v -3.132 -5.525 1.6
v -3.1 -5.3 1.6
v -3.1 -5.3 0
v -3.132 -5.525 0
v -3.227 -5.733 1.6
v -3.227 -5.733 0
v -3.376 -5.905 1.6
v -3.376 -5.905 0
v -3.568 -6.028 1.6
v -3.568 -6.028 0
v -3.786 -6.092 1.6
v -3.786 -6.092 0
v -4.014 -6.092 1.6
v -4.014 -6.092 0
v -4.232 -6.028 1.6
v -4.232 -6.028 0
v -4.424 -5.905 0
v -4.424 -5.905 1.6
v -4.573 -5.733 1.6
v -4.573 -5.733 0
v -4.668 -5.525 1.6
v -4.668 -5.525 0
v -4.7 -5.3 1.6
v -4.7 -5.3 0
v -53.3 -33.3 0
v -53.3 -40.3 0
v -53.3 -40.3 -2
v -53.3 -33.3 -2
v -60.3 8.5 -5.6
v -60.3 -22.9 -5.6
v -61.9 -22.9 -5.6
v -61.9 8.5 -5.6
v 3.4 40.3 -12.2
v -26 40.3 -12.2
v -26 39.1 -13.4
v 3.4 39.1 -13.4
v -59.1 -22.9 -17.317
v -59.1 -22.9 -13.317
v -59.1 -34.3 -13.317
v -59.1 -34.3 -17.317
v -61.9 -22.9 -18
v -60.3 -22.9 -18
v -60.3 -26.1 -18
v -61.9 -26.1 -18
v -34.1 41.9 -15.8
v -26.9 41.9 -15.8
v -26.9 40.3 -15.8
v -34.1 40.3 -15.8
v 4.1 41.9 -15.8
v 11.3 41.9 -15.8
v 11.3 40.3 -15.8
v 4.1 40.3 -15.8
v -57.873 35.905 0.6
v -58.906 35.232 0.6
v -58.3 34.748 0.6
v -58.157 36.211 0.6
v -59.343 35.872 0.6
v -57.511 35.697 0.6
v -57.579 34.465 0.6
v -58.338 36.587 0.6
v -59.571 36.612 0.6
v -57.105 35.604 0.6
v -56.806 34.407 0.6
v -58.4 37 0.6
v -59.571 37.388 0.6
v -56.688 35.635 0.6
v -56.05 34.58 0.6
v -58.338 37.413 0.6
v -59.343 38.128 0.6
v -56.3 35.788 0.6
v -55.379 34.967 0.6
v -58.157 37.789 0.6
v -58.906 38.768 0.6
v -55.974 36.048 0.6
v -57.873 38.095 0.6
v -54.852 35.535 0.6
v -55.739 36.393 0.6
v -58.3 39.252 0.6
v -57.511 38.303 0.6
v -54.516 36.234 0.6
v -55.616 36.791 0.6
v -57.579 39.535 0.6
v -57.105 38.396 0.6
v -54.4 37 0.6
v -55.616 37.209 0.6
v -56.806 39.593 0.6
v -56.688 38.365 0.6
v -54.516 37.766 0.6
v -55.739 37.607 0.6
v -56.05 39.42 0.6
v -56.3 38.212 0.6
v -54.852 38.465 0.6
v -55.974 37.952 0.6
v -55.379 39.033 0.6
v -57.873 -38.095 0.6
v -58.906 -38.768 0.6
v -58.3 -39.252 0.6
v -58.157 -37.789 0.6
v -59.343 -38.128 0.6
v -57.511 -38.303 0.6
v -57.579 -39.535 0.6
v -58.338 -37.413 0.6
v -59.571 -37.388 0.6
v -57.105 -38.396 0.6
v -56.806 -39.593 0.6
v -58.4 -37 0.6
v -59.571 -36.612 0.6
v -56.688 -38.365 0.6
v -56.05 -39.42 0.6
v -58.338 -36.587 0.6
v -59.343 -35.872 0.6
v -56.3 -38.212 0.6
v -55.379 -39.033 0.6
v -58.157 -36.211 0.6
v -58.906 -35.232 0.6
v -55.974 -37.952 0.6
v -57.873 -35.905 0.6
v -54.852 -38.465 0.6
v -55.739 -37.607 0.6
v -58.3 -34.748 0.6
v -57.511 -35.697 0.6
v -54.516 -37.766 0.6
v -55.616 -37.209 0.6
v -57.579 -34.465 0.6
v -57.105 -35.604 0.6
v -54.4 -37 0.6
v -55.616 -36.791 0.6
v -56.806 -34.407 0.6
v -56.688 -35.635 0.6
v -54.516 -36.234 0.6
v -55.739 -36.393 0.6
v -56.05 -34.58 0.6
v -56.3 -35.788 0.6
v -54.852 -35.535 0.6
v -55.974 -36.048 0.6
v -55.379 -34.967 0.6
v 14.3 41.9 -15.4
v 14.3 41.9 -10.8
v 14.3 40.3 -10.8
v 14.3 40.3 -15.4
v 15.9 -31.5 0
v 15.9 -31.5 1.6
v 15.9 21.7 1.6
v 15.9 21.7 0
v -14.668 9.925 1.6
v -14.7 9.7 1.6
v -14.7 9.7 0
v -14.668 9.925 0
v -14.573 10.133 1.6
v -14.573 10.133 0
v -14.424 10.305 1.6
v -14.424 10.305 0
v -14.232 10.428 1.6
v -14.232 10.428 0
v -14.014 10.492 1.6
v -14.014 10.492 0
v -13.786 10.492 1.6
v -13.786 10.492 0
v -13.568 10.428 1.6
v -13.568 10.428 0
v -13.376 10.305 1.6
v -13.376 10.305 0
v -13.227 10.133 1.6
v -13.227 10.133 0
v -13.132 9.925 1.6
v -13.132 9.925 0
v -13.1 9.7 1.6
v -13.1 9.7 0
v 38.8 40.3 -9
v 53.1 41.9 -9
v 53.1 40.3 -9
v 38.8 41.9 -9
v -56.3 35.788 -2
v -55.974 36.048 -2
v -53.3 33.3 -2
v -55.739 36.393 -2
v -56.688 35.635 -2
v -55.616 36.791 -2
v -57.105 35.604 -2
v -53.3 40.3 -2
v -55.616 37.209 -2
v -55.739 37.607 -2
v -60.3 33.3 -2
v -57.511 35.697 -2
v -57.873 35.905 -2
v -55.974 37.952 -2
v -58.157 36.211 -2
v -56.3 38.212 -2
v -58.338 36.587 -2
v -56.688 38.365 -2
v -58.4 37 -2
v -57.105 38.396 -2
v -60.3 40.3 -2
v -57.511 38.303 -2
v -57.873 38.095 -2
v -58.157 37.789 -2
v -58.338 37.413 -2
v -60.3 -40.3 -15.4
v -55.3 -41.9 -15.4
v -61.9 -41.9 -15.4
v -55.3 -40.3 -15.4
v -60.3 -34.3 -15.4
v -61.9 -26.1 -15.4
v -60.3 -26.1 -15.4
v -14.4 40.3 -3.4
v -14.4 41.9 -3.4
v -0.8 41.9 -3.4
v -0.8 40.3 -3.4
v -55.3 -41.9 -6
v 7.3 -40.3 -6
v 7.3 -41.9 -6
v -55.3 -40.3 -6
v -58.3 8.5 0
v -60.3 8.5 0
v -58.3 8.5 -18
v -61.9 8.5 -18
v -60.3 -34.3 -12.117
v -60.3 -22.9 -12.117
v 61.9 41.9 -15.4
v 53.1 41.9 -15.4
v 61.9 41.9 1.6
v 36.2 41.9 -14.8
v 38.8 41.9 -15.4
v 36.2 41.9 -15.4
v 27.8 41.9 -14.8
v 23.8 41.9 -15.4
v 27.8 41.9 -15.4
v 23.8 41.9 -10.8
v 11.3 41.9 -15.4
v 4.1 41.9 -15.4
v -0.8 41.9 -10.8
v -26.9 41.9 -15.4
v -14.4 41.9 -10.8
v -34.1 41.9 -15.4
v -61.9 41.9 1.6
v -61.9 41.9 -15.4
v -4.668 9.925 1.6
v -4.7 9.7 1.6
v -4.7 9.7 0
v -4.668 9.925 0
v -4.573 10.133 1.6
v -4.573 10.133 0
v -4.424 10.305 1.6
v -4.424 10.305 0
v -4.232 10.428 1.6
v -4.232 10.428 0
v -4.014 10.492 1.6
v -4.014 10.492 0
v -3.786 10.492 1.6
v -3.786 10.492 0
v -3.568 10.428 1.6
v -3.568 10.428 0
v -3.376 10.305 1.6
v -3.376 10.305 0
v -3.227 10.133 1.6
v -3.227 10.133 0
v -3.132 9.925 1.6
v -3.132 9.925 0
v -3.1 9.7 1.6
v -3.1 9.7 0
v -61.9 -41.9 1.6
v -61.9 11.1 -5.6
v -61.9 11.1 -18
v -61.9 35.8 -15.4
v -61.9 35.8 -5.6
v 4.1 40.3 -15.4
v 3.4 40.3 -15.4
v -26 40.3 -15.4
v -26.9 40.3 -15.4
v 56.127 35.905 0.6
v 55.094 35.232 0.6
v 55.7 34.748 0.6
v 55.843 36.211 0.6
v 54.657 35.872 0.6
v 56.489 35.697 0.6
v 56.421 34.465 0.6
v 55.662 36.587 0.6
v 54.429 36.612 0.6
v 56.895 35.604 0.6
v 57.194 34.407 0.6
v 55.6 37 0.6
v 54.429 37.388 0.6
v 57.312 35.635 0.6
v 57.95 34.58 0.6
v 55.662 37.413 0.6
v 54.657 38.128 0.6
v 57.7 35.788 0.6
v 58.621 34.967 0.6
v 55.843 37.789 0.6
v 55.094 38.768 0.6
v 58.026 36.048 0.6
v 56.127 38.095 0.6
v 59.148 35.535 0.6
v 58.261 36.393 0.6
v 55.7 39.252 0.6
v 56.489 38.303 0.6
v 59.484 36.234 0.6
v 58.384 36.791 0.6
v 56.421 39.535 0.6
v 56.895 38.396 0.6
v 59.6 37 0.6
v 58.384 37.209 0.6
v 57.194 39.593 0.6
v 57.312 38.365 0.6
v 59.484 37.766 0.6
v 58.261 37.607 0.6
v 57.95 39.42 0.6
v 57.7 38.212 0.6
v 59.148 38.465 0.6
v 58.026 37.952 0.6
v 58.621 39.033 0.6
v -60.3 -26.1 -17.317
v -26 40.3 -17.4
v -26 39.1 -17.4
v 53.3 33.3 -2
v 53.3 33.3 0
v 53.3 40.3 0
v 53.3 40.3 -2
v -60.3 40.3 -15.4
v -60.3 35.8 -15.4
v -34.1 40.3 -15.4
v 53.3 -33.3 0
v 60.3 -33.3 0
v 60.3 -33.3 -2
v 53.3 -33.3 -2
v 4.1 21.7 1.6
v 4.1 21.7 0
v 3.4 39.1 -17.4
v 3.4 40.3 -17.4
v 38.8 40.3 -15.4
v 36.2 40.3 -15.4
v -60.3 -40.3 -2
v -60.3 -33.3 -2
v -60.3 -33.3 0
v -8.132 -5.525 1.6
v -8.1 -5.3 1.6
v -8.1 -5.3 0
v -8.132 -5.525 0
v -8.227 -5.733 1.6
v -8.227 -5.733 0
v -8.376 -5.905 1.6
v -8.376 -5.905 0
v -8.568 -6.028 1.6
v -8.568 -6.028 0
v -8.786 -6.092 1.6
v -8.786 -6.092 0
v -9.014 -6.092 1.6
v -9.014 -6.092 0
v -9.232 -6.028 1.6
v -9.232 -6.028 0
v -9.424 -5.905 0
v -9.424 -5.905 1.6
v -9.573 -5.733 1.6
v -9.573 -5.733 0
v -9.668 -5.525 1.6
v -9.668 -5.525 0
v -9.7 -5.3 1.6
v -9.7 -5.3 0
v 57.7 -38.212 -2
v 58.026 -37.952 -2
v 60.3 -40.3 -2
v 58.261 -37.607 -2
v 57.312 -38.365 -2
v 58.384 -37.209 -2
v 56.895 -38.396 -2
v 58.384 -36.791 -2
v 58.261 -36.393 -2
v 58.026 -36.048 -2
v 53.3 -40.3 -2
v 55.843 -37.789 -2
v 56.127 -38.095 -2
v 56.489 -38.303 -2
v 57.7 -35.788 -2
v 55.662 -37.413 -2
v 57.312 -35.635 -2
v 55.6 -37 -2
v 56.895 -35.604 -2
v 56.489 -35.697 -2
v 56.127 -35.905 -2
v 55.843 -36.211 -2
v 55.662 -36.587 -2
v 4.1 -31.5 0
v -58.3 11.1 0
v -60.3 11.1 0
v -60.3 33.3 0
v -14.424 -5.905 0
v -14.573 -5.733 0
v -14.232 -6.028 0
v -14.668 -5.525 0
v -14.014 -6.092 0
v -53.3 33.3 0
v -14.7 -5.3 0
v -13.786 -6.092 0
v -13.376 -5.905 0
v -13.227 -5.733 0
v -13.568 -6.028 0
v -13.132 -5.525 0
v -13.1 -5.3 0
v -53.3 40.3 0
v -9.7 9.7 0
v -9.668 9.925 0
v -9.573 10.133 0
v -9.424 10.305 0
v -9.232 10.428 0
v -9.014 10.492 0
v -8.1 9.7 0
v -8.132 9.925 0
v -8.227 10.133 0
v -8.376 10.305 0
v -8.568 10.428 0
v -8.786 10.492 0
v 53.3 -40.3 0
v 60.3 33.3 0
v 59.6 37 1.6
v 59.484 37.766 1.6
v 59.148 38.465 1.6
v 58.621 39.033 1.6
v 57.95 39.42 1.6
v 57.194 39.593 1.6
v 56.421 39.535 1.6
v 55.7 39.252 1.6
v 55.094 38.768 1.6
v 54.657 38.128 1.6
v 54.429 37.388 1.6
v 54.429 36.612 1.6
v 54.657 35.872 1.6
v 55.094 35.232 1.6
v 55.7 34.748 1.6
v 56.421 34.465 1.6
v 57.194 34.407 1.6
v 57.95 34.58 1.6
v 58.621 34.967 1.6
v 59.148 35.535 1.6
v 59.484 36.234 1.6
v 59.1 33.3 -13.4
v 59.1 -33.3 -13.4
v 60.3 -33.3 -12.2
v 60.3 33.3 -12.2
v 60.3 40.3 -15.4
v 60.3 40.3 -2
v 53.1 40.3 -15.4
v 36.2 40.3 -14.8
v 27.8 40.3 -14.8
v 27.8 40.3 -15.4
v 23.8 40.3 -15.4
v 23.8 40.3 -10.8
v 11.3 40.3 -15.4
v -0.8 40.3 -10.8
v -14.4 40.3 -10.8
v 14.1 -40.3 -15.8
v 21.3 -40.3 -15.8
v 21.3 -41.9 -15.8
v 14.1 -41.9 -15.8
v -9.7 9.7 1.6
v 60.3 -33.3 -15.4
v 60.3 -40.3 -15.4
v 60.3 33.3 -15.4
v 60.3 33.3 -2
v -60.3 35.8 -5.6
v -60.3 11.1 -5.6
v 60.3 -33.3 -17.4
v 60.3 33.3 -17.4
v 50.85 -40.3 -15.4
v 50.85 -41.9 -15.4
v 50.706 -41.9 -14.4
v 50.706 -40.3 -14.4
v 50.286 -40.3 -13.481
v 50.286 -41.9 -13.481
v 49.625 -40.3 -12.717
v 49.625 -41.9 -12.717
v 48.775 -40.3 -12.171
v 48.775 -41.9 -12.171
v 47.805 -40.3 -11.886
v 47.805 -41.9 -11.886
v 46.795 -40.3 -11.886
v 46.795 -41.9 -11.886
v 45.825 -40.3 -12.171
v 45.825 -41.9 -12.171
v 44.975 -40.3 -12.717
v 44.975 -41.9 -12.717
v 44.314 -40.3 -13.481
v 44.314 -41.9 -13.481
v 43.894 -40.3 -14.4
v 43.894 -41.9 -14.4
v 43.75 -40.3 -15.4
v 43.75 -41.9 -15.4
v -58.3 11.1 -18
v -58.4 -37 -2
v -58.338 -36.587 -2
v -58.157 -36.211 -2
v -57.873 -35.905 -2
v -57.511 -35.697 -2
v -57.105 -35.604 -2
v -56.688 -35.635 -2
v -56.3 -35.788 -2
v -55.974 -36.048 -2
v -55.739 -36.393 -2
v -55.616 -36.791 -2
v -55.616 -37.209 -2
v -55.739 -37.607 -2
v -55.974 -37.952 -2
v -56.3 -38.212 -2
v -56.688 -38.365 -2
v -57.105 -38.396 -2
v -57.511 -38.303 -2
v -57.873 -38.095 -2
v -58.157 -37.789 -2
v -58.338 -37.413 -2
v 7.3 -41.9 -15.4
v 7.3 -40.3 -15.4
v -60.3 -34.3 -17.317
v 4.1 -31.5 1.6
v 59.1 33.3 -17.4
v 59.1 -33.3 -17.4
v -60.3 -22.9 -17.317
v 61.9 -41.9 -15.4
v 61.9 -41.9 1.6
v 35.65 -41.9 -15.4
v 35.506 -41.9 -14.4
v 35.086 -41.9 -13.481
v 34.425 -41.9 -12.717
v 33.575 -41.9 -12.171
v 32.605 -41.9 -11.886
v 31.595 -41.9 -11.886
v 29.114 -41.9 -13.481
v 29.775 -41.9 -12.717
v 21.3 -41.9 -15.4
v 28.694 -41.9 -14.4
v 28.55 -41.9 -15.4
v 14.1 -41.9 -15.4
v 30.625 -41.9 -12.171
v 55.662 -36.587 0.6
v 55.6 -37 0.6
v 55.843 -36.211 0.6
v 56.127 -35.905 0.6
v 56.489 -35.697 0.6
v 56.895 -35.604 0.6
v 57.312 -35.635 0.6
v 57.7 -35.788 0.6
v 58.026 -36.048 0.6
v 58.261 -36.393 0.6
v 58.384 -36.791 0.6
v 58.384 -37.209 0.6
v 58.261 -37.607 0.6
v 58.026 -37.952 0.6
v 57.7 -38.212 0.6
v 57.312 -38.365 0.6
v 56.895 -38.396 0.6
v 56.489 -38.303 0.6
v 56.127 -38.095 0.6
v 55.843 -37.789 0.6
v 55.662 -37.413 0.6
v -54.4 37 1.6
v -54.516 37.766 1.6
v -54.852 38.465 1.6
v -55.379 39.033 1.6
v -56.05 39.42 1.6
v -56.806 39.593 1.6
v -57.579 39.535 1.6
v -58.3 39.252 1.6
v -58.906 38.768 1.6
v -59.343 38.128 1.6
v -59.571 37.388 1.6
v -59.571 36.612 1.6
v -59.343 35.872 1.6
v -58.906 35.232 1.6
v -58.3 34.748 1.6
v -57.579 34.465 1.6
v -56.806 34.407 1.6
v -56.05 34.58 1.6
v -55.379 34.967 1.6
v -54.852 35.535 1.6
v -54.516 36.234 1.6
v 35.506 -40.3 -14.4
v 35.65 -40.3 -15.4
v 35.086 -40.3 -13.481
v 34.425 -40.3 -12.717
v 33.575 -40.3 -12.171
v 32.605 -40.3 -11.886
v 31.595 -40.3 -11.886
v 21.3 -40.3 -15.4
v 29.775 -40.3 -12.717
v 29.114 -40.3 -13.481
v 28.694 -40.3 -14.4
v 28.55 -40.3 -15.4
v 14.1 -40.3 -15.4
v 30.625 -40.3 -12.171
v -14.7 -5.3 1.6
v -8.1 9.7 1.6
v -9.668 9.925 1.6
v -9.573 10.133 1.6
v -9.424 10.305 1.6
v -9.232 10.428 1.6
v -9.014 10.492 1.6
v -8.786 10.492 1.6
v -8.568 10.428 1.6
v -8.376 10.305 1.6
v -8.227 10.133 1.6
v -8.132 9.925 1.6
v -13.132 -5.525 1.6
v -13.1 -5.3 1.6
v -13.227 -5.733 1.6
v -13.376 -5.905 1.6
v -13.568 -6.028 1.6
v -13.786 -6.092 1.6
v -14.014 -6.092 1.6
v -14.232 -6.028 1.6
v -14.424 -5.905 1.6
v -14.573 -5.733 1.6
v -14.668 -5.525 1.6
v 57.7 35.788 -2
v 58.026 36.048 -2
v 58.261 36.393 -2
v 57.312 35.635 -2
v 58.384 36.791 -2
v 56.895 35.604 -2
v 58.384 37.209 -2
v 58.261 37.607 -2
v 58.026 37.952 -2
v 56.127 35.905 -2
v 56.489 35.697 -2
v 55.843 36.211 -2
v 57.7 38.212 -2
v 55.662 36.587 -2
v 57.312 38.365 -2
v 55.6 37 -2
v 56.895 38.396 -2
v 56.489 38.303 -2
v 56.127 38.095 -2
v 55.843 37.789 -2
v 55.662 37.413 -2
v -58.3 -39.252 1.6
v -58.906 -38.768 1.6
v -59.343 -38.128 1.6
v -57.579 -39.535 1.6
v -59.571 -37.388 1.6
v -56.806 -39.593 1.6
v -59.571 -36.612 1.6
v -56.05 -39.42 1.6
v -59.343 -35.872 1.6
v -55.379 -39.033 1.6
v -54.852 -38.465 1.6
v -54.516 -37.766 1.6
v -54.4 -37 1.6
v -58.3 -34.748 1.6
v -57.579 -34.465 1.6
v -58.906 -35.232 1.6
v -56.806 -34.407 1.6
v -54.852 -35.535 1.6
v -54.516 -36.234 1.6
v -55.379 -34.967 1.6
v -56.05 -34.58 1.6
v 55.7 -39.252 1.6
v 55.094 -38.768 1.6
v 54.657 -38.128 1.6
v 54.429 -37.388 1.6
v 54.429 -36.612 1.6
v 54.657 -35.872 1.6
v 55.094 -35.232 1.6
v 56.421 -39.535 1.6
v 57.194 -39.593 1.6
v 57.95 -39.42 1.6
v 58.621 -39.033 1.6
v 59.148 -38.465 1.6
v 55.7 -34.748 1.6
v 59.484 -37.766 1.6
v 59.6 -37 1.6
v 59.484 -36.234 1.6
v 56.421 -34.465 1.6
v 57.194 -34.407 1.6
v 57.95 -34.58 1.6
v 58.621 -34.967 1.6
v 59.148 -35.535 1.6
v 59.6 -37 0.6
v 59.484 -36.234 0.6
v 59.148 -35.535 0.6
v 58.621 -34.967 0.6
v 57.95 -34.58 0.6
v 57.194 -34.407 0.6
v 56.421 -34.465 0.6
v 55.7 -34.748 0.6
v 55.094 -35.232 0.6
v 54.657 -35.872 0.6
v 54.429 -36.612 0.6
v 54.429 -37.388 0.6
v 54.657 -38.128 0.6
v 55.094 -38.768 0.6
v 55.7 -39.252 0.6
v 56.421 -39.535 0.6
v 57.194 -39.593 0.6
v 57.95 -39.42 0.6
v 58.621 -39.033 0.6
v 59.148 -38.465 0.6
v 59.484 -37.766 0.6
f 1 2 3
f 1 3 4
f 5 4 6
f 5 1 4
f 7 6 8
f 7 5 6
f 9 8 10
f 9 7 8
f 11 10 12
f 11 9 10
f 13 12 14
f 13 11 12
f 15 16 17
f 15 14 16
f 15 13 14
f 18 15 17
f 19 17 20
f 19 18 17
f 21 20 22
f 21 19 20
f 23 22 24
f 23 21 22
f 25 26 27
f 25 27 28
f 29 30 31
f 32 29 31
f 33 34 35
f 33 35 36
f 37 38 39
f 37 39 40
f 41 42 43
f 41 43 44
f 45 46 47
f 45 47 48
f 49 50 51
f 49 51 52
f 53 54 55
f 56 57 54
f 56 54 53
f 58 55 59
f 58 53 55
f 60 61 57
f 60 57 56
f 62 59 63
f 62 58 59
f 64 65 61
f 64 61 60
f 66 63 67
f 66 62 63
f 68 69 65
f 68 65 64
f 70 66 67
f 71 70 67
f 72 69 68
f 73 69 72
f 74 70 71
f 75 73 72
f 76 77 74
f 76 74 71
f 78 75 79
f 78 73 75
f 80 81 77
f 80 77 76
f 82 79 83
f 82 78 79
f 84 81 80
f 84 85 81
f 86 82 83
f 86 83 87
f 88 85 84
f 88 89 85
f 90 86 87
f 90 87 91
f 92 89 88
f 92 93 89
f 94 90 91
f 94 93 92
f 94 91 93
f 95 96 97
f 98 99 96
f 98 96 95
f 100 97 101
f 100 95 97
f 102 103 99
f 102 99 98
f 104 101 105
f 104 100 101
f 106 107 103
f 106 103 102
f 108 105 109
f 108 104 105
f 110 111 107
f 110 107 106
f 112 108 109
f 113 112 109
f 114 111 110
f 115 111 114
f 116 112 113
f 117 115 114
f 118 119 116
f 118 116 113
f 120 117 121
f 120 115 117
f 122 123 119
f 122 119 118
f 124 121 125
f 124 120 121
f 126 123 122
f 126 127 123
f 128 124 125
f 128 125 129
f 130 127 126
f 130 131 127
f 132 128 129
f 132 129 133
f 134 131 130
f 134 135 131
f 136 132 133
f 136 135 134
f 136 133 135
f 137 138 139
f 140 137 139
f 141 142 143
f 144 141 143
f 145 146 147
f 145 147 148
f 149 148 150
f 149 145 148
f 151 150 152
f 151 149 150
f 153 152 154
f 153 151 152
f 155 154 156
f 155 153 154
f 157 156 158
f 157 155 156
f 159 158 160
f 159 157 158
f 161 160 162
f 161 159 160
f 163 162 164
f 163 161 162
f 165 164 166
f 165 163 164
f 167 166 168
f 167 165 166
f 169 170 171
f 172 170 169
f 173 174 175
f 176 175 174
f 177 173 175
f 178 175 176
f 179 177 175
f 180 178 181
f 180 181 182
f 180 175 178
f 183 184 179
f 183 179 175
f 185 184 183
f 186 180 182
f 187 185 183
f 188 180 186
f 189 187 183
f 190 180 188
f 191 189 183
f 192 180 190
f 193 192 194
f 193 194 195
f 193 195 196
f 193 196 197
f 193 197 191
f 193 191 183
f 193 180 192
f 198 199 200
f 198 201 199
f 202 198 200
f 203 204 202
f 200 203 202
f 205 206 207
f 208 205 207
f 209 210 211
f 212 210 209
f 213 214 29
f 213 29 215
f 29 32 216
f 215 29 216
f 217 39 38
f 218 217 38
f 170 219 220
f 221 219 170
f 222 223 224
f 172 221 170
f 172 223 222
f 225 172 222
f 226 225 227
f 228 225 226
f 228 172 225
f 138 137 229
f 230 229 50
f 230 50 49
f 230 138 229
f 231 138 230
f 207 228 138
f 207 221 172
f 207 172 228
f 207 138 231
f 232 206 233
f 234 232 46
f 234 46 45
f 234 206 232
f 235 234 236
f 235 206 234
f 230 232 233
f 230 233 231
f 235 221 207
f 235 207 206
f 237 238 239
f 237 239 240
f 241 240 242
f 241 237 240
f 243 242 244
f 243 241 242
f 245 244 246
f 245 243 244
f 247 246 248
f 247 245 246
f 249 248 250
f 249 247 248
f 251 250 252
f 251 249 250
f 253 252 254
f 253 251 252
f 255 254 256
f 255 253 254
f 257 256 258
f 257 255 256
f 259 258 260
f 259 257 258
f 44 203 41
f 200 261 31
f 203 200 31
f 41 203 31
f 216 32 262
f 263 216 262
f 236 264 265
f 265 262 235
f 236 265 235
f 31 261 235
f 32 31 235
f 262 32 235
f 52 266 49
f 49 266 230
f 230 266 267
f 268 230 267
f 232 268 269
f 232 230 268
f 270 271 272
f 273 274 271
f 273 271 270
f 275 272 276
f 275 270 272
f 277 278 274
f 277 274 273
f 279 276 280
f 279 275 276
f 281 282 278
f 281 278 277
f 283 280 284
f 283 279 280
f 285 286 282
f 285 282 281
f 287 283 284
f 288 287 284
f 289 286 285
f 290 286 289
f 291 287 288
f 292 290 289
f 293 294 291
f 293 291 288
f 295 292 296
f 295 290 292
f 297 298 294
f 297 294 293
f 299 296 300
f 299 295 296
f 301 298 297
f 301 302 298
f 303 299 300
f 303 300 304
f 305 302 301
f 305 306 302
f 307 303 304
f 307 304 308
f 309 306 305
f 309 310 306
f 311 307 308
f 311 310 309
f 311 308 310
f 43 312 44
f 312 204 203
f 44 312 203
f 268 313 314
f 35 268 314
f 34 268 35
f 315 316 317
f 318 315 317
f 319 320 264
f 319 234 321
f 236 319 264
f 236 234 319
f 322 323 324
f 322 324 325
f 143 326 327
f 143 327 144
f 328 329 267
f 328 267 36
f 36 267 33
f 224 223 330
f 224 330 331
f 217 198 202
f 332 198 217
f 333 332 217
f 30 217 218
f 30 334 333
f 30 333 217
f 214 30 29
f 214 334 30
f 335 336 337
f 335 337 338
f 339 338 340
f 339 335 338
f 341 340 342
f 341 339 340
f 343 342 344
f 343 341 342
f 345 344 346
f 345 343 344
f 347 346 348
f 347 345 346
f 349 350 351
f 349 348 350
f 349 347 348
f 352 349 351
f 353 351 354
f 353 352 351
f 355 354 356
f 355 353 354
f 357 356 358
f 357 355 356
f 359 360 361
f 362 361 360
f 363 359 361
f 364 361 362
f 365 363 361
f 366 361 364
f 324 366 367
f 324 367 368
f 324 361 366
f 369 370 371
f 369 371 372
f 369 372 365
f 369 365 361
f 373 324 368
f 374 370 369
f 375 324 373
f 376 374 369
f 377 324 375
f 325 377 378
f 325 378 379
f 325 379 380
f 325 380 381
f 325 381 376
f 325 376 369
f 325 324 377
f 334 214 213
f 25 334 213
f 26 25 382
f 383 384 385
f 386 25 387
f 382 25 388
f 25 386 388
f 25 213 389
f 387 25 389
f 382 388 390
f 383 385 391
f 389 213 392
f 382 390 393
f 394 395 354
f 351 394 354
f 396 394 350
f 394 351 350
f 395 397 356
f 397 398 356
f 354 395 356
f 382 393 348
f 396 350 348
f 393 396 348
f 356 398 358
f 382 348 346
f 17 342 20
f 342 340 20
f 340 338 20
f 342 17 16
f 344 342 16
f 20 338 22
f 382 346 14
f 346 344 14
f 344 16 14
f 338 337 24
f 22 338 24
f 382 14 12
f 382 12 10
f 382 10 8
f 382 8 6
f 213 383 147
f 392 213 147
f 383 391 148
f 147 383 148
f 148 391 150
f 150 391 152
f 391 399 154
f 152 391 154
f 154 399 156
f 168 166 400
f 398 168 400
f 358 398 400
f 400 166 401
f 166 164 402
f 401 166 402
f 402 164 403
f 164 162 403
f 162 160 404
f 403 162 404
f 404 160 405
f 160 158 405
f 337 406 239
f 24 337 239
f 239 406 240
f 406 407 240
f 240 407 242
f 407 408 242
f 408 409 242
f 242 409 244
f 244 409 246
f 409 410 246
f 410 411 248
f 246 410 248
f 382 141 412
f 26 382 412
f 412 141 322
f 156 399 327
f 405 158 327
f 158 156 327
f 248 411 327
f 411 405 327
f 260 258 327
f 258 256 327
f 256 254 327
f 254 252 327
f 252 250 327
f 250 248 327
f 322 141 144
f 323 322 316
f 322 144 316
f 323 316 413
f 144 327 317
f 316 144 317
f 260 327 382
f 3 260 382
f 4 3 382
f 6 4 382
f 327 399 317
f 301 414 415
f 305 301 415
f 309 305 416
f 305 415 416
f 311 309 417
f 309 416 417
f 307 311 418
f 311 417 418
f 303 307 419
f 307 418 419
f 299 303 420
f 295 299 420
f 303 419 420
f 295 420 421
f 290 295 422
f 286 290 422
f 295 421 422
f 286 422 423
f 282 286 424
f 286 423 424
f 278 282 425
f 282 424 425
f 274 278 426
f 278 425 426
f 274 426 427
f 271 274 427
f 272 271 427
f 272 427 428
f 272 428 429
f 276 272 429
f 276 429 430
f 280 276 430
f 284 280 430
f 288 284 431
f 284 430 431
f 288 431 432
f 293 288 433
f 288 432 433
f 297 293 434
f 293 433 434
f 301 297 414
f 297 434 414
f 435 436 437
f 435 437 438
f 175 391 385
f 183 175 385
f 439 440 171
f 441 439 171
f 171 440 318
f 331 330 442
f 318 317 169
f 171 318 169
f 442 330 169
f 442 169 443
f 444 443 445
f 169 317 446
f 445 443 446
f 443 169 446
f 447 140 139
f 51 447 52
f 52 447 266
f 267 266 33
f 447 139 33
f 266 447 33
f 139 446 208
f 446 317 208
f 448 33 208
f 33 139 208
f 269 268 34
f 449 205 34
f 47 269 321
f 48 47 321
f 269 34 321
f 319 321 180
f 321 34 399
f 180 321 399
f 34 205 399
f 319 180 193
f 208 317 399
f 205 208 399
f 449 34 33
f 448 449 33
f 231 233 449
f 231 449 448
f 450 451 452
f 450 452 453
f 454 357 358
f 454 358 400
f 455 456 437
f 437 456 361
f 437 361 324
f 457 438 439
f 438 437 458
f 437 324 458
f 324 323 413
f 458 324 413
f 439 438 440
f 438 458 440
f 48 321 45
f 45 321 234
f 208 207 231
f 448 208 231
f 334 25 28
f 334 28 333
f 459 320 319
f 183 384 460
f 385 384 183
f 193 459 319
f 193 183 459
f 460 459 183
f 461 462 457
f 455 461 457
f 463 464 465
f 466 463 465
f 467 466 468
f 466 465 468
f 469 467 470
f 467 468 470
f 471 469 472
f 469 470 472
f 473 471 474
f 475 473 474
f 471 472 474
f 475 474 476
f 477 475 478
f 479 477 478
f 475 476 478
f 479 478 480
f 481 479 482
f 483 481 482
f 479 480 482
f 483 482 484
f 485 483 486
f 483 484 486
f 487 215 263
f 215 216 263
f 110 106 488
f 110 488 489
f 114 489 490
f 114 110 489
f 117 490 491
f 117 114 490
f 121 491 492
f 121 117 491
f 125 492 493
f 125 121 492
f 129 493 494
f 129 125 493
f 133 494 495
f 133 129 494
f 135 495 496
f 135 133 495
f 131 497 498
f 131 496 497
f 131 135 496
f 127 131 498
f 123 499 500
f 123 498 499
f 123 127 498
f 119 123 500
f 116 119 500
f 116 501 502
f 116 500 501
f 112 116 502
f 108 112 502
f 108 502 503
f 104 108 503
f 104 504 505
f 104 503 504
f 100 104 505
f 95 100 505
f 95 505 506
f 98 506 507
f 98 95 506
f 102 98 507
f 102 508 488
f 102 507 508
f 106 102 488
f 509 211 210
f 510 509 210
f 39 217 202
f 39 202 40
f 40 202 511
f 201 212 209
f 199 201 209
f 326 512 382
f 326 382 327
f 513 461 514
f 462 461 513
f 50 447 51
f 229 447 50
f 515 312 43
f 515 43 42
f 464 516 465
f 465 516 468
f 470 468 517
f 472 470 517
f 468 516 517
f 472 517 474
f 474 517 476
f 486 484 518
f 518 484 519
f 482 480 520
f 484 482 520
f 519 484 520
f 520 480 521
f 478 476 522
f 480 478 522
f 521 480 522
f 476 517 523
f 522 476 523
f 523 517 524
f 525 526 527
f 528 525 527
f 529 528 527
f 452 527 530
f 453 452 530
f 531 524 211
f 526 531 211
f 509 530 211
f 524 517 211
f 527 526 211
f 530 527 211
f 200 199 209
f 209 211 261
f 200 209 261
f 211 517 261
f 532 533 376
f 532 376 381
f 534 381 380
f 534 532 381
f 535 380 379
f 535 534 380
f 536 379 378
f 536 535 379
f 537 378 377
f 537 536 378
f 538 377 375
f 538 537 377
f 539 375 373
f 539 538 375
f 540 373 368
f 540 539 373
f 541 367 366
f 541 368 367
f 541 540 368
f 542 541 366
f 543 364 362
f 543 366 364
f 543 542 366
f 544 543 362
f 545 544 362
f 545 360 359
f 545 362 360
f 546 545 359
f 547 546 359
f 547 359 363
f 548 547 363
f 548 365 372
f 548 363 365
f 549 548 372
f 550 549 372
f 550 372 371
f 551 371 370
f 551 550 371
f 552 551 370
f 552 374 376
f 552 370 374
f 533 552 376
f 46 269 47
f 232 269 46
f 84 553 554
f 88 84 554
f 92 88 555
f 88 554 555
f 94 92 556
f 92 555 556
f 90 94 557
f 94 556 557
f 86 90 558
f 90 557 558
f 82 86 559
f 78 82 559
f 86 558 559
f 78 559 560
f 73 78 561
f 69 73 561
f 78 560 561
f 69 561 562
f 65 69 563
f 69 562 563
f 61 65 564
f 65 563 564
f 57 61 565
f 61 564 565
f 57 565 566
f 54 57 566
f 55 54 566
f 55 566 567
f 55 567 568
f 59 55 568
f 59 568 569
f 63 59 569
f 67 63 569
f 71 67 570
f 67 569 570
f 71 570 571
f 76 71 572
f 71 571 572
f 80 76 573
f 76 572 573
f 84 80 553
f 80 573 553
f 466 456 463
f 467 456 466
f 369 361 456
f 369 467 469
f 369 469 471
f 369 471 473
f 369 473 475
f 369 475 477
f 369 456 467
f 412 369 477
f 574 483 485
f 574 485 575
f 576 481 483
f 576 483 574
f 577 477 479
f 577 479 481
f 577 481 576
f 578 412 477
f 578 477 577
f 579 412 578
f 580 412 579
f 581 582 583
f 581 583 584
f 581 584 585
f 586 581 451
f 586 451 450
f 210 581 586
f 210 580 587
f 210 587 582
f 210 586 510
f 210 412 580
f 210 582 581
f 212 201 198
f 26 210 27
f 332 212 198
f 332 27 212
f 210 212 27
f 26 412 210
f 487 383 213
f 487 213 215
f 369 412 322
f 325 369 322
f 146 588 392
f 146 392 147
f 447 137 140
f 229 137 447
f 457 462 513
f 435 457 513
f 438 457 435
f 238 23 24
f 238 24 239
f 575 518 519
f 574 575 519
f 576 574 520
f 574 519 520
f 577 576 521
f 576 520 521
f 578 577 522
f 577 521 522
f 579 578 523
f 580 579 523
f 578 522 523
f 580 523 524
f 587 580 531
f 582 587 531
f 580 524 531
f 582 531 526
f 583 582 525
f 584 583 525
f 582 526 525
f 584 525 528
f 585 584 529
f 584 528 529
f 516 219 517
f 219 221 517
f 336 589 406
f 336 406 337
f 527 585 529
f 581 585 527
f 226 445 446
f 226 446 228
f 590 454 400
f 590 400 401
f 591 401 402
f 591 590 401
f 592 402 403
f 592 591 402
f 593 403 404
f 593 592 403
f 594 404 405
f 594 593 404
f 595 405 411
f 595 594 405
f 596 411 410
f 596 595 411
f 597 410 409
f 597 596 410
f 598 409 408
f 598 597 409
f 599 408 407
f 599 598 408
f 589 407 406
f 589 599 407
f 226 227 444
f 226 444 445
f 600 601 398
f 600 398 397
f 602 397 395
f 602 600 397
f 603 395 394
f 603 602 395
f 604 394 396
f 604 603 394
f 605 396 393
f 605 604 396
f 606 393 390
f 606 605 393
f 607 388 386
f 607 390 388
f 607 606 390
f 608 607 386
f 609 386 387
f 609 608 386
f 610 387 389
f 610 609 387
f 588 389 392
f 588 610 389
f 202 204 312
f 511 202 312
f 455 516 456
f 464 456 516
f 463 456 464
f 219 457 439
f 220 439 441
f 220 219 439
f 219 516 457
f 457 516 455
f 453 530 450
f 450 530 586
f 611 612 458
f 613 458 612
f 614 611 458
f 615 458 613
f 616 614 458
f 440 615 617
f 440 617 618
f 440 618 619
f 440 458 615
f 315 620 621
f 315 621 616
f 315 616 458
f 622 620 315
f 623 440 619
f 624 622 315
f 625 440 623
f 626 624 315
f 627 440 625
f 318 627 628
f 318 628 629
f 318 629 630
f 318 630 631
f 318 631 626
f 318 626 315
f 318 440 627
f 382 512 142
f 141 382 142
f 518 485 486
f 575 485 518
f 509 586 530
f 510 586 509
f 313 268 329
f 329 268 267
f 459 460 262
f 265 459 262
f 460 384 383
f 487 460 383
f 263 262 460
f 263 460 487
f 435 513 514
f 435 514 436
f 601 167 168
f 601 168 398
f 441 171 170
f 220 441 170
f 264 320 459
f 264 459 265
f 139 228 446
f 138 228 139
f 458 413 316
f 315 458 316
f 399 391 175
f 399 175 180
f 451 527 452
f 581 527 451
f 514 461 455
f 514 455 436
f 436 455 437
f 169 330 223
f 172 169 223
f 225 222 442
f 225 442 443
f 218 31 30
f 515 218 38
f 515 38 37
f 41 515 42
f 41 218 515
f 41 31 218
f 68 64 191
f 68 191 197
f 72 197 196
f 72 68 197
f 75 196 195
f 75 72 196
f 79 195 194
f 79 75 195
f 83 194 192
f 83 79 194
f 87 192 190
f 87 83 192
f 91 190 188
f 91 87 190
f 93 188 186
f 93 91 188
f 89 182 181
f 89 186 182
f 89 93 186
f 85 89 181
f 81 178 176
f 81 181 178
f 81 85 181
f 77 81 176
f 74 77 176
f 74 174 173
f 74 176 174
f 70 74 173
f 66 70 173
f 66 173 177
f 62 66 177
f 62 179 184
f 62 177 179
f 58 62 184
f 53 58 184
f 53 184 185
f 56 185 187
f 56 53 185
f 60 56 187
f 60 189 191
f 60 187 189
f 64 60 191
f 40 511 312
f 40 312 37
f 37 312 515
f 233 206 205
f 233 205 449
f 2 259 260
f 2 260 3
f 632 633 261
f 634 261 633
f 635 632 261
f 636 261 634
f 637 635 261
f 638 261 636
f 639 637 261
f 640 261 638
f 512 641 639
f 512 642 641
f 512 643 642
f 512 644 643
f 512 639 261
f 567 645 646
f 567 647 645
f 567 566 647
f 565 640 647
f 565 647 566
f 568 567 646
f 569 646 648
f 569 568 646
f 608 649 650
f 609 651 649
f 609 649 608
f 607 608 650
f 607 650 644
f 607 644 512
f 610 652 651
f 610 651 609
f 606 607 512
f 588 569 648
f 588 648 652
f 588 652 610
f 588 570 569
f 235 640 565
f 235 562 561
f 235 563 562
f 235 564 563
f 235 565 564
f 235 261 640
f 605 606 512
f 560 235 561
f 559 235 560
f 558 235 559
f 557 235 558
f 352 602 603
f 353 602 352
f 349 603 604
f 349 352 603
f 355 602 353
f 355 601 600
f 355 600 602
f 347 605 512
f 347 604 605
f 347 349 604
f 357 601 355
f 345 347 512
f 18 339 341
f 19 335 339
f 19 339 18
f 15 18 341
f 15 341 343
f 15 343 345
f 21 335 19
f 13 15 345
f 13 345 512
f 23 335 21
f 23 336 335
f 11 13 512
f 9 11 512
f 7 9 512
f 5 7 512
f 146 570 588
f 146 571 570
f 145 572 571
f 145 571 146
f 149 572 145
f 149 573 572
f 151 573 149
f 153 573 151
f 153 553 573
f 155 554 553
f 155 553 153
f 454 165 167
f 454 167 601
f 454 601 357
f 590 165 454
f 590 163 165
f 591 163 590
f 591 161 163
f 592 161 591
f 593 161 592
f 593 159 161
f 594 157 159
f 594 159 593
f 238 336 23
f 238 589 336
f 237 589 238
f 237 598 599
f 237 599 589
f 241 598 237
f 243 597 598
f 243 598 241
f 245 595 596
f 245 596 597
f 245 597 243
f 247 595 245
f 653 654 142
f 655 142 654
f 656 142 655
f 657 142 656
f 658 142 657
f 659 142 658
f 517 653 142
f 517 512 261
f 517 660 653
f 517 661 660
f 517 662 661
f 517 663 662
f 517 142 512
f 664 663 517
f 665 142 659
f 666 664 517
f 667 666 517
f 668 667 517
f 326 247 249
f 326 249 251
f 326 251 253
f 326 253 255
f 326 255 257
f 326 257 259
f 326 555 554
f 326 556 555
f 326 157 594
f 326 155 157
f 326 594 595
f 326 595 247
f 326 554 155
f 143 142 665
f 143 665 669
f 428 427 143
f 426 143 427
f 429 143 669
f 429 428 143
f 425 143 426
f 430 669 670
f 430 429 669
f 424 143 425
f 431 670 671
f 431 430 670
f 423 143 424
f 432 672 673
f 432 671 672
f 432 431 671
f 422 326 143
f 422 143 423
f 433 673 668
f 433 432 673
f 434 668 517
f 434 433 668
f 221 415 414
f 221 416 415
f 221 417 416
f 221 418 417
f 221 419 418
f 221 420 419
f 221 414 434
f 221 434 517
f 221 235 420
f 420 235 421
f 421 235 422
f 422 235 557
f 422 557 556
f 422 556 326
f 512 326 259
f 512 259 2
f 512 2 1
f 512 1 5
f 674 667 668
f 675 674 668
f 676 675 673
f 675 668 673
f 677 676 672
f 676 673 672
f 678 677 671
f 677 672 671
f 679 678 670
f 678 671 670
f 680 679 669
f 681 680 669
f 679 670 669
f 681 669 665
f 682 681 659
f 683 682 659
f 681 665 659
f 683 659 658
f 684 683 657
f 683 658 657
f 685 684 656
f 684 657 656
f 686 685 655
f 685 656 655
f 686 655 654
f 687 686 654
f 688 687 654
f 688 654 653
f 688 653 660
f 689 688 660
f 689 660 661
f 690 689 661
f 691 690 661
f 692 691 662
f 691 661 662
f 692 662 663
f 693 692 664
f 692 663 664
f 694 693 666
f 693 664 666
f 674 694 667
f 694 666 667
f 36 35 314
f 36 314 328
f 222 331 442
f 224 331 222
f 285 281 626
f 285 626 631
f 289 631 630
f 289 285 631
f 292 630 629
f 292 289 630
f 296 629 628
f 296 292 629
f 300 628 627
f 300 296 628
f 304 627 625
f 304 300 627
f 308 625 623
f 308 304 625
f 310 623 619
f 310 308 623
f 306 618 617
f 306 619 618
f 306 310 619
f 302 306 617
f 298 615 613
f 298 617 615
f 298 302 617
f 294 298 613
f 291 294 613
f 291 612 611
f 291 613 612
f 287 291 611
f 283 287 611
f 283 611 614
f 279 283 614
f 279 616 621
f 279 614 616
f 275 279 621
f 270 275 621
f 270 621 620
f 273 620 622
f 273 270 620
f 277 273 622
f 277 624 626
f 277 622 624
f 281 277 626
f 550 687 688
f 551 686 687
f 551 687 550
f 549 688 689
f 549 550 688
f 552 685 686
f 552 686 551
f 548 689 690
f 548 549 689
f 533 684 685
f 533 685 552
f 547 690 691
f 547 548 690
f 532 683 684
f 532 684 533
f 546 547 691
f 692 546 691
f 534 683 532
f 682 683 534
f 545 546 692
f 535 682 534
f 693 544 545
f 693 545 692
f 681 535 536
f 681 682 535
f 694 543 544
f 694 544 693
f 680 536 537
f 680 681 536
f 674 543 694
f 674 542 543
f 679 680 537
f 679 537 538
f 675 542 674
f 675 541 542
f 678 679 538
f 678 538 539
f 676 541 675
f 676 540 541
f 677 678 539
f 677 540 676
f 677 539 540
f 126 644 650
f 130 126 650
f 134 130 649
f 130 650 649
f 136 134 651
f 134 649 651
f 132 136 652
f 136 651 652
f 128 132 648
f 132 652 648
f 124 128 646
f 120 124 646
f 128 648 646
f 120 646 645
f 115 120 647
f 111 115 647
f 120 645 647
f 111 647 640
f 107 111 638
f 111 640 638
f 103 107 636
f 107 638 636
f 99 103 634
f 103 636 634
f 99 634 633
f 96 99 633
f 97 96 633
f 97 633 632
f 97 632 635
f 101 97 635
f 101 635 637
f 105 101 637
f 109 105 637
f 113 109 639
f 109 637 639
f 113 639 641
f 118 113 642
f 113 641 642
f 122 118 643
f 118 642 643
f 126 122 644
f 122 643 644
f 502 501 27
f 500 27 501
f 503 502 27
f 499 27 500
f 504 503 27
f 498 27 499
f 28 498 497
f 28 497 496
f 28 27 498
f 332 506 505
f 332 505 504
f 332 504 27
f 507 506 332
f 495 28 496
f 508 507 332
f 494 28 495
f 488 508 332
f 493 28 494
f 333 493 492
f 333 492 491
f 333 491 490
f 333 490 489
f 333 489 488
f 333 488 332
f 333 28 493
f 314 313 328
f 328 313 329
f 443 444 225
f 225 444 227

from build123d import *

# Parameters (mm, degrees)
SKETCH1_W               = 120.6
SKETCH1_H               = 80.6
BOSS_EXTRUDE1_DEPTH     = 1.6
SKETCH2_W               = 123.8
SKETCH2_H               = 83.8
BOSS_EXTRUDE2_DEPTH     = 1.6
SKETCH15_W              = 54.6
SKETCH15_H              = 1.6
BOSS_EXTRUDE10_DEPTH    = 15.4
SKETCH16_R              = 3.55
CUT_EXTRUDE5_DEPTH      = 15.5
BOSS_EXTRUDE11_DEPTH    = 15.4
SKETCH18_W              = 1.6
SKETCH18_H              = 3.2
SKETCH18_H_2            = 2.6
BOSS_EXTRUDE12_DEPTH    = 18
BOSS_EXTRUDE13_DEPTH    = 15.4
SKETCH20_W              = 15
SKETCH20_H              = 1.6
BOSS_EXTRUDE14_DEPTH    = 15.4
BOSS_EXTRUDE15_DEPTH    = 15.4
SKETCH22_W              = 62.6
SKETCH22_H              = 1.6
BOSS_EXTRUDE16_DEPTH    = 6
SKETCH23_W              = 1.6
SKETCH23_H              = 31.4
BOSS_EXTRUDE17_DEPTH    = 5.6
SKETCH24_W              = 1.6
SKETCH24_H              = 24.7
BOSS_EXTRUDE18_DEPTH    = 5.6
SKETCH25_W              = 11.5
SKETCH25_H              = 1.6
BOSS_EXTRUDE19_DEPTH    = 10.8
SKETCH26_W              = 14.3
SKETCH26_H              = 1.6
BOSS_EXTRUDE20_DEPTH    = 9
SKETCH27_W              = 8.4
SKETCH27_H              = 1.6
CUT_EXTRUDE6_DEPTH      = 0.6
SKETCH29_W              = 7
SKETCH29_H              = 7
BOSS_EXTRUDE21_DEPTH    = 2
CUT_EXTRUDE8_DEPTH      = 77.884458768
CUT_EXTRUDE8_DEPTH_BACK = 77.884458768
SKETCH28_R              = 1.4
SKETCH30_R              = 2.6
CUT_EXTRUDE9_DEPTH      = 1
SKETCH31_W              = 11.8
SKETCH31_H              = 53.2
CUT_EXTRUDE11_DEPTH     = 78.274704788
SKETCH32_W              = 13.6
SKETCH32_H              = 7.4
CUT_EXTRUDE12_DEPTH     = 10
SKETCH34_W              = 7.2
SKETCH34_H              = 1.6
BOSS_EXTRUDE22_DEPTH    = 0.4
SKETCH35_W              = 7.2
SKETCH35_H              = 1.6
BOSS_EXTRUDE23_DEPTH    = 0.4
SKETCH36_W              = 4
SKETCH36_H              = 66.6
BOSS_EXTRUDE25_DEPTH    = 1.2
SKETCH37_W              = 4
SKETCH37_H              = 11.4
BOSS_EXTRUDE31_DEPTH    = 1.2
SKETCH37_2_W            = 4
SKETCH37_2_H            = 11.4
BOSS_EXTRUDE36_DEPTH    = 1.2
SKETCH37_3_W            = 4
SKETCH37_3_H            = 11.4
BOSS_EXTRUDE37_DEPTH    = 1.2
SKETCH38_W              = 29.4
SKETCH38_H              = 4
BOSS_EXTRUDE40_DEPTH    = 1.2
CHAMFER1_SIZE           = 1.2
SKETCH39_W              = 18
SKETCH39_H              = 2.6
BOSS_EXTRUDE41_DEPTH    = 2


with BuildPart() as part:
    # Sketch1 → Boss-Extrude1 (new body)
    with BuildSketch(Plane.XY):
        Rectangle(SKETCH1_W, SKETCH1_H)
    extrude(amount=BOSS_EXTRUDE1_DEPTH)

    # Sketch2 → Boss-Extrude2 (add)
    with BuildSketch(Plane.XY):
        Rectangle(SKETCH2_W, SKETCH2_H)
    extrude(amount=BOSS_EXTRUDE2_DEPTH)

    # Sketch15 → Boss-Extrude10 (add)
    with BuildSketch(Plane(origin=(0, 0, 0), x_dir=(-1, 0, 0), z_dir=(0, 0, -1))):
        with Locations((-34.6, -41.1)):
            Rectangle(SKETCH15_W, SKETCH15_H)
    extrude(amount=BOSS_EXTRUDE10_DEPTH)

    # Sketch16 → Cut-Extrude5 (cut)
    with BuildSketch(Plane.XZ.offset(41.9)):
        with Locations((47.3, -15.4)):
            Circle(SKETCH16_R)
        with Locations((32.1, -15.4)):
            Circle(SKETCH16_R)
    extrude(amount=-CUT_EXTRUDE5_DEPTH, mode=Mode.SUBTRACT)

    # Sketch17 → Boss-Extrude11 (add)
    with BuildSketch(Plane(origin=(0, 0, 0), x_dir=(-1, 0, 0), z_dir=(0, 0, -1))):
        Polygon((55.3, -41.9), (61.9, -41.9), (61.9, -26.1), (60.3, -26.1), (60.3, -40.3), (55.3, -40.3), align=None)
    extrude(amount=BOSS_EXTRUDE11_DEPTH)

    # Sketch18 → Boss-Extrude12 (add)
    with BuildSketch(Plane(origin=(0, 0, 0), x_dir=(-1, 0, 0), z_dir=(0, 0, -1))):
        with Locations((61.1, -24.5)):
            Rectangle(SKETCH18_W, SKETCH18_H)
        with Locations((61.1, 9.8)):
            Rectangle(SKETCH18_W, SKETCH18_H_2)
    extrude(amount=BOSS_EXTRUDE12_DEPTH)

    # Sketch19 → Boss-Extrude13 (add)
    with BuildSketch(Plane(origin=(0, 0, 0), x_dir=(-1, 0, 0), z_dir=(0, 0, -1))):
        Polygon((60.3, 35.8), (61.9, 35.8), (61.9, 41.9), (-14.3, 41.9), (-14.3, 40.3), (60.3, 40.3), align=None)
    extrude(amount=BOSS_EXTRUDE13_DEPTH)

    # Sketch20 → Boss-Extrude14 (add)
    with BuildSketch(Plane(origin=(0, 0, 0), x_dir=(-1, 0, 0), z_dir=(0, 0, -1))):
        with Locations((-31.3, 41.1)):
            Rectangle(SKETCH20_W, SKETCH20_H)
    extrude(amount=BOSS_EXTRUDE14_DEPTH)

    # Sketch21 → Boss-Extrude15 (add)
    with BuildSketch(Plane(origin=(0, 0, 0), x_dir=(-1, 0, 0), z_dir=(0, 0, -1))):
        Polygon((-53.1, 40.3), (-53.1, 41.9), (-61.9, 41.9), (-61.9, -40.3), (-60.3, -40.3), (-60.3, 40.3), align=None)
    extrude(amount=BOSS_EXTRUDE15_DEPTH)

    # Sketch22 → Boss-Extrude16 (add)
    with BuildSketch(Plane(origin=(0, 0, 0), x_dir=(-1, 0, 0), z_dir=(0, 0, -1))):
        with Locations((24, -41.1)):
            Rectangle(SKETCH22_W, SKETCH22_H)
    extrude(amount=BOSS_EXTRUDE16_DEPTH)

    # Sketch23 → Boss-Extrude17 (add)
    with BuildSketch(Plane(origin=(0, 0, 0), x_dir=(-1, 0, 0), z_dir=(0, 0, -1))):
        with Locations((61.1, -7.2)):
            Rectangle(SKETCH23_W, SKETCH23_H)
    extrude(amount=BOSS_EXTRUDE17_DEPTH)

    # Sketch24 → Boss-Extrude18 (add)
    with BuildSketch(Plane(origin=(0, 0, 0), x_dir=(-1, 0, 0), z_dir=(0, 0, -1))):
        with Locations((61.1, 23.45)):
            Rectangle(SKETCH24_W, SKETCH24_H)
    extrude(amount=BOSS_EXTRUDE18_DEPTH)

    # Sketch25 → Boss-Extrude19 (add)
    with BuildSketch(Plane(origin=(0, 0, 0), x_dir=(-1, 0, 0), z_dir=(0, 0, -1))):
        with Locations((-19.65, 41.1)):
            Rectangle(SKETCH25_W, SKETCH25_H)
    extrude(amount=BOSS_EXTRUDE19_DEPTH)

    # Sketch26 → Boss-Extrude20 (add)
    with BuildSketch(Plane(origin=(0, 0, 0), x_dir=(-1, 0, 0), z_dir=(0, 0, -1))):
        with Locations((-45.95, 41.1)):
            Rectangle(SKETCH26_W, SKETCH26_H)
    extrude(amount=BOSS_EXTRUDE20_DEPTH)

    # Sketch27 → Cut-Extrude6 (cut)
    with BuildSketch(Plane(origin=(0, 0, -15.4), x_dir=(-1, 0, 0), z_dir=(0, 0, -1))):
        with Locations((-32, 41.1)):
            Rectangle(SKETCH27_W, SKETCH27_H)
    extrude(amount=-CUT_EXTRUDE6_DEPTH, mode=Mode.SUBTRACT)

    # Sketch29 → Boss-Extrude21 (add)
    with BuildSketch(Plane(origin=(0, 0, 0), x_dir=(-1, 0, 0), z_dir=(0, 0, -1))):
        with Locations((-56.8, -36.8)):
            Rectangle(SKETCH29_W, SKETCH29_H)
        with Locations((-56.8, 36.8)):
            Rectangle(SKETCH29_W, SKETCH29_H)
        with Locations((56.8, 36.8)):
            Rectangle(SKETCH29_W, SKETCH29_H)
        with Locations((56.8, -36.8)):
            Rectangle(SKETCH29_W, SKETCH29_H)
    extrude(amount=BOSS_EXTRUDE21_DEPTH)

    # Sketch28 → Cut-Extrude8 (cut, two sides: drawn at the far end of the back side and taken through both)
    with BuildSketch(Plane(origin=(0, 0, 0), x_dir=(-1, 0, 0), z_dir=(0, 0, -1)).offset(-CUT_EXTRUDE8_DEPTH_BACK)):
        with Locations((-57, 37)):
            Circle(SKETCH28_R)
        with Locations((57, 37)):
            Circle(SKETCH28_R)
        with Locations((57, -37)):
            Circle(SKETCH28_R)
        with Locations((-57, -37)):
            Circle(SKETCH28_R)
    extrude(amount=CUT_EXTRUDE8_DEPTH + CUT_EXTRUDE8_DEPTH_BACK, mode=Mode.SUBTRACT)

    # Sketch30 → Cut-Extrude9 (cut)
    with BuildSketch(Plane.XY.offset(1.6)):
        with Locations((-57, 37)):
            Circle(SKETCH30_R)
        with Locations((57, 37)):
            Circle(SKETCH30_R)
        with Locations((57, -37)):
            Circle(SKETCH30_R)
        with Locations((-57, -37)):
            Circle(SKETCH30_R)
    extrude(amount=-CUT_EXTRUDE9_DEPTH, mode=Mode.SUBTRACT)

    # Sketch31 → Cut-Extrude11 (cut, through all)
    with BuildSketch(Plane.XY.offset(1.6)):
        with Locations((10, -4.9)):
            Rectangle(SKETCH31_W, SKETCH31_H)
        with BuildLine():
            Line((-8.1, 9.7), (-8.1, -5.3))
            ThreePointArc((-8.1, -5.3), (-8.9, -6.1), (-9.7, -5.3))
            Line((-9.7, -5.3), (-9.7, 9.7))
            ThreePointArc((-9.7, 9.7), (-8.9, 10.5), (-8.1, 9.7))
        make_face()
        with BuildLine():
            Line((-13.1, 9.7), (-13.1, -5.3))
            ThreePointArc((-13.1, -5.3), (-13.9, -6.1), (-14.7, -5.3))
            Line((-14.7, -5.3), (-14.7, 9.7))
            ThreePointArc((-14.7, 9.7), (-13.9, 10.5), (-13.1, 9.7))
        make_face()
        with BuildLine():
            Line((-3.1, 9.7), (-3.1, -5.3))
            ThreePointArc((-3.1, -5.3), (-3.9, -6.1), (-4.7, -5.3))
            Line((-4.7, -5.3), (-4.7, 9.7))
            ThreePointArc((-4.7, 9.7), (-3.9, 10.5), (-3.1, 9.7))
        make_face()
    extrude(amount=-CUT_EXTRUDE11_DEPTH, mode=Mode.SUBTRACT)

    # Sketch32 → Cut-Extrude12 (cut)
    with BuildSketch(Plane(origin=(0, 41.9, 0), x_dir=(1, 0, 0), z_dir=(0, 1, 0))):
        with Locations((-7.6, 7.1)):
            Rectangle(SKETCH32_W, SKETCH32_H)
    extrude(amount=-CUT_EXTRUDE12_DEPTH, mode=Mode.SUBTRACT)

    # Sketch34 → Boss-Extrude22 (add)
    with BuildSketch(Plane(origin=(0, 0, -15.4), x_dir=(-1, 0, 0), z_dir=(0, 0, -1))):
        with Locations((-7.7, 41.1)):
            Rectangle(SKETCH34_W, SKETCH34_H)
        with Locations((30.5, 41.1)):
            Rectangle(SKETCH34_W, SKETCH34_H)
    extrude(amount=BOSS_EXTRUDE22_DEPTH)

    # Sketch35 → Boss-Extrude23 (add)
    with BuildSketch(Plane(origin=(0, 0, -15.4), x_dir=(-1, 0, 0), z_dir=(0, 0, -1))):
        with Locations((-17.7, -41.1)):
            Rectangle(SKETCH35_W, SKETCH35_H)
    extrude(amount=BOSS_EXTRUDE23_DEPTH)

    # Sketch36 → Boss-Extrude25 (add)
    with BuildSketch(Plane.ZY.offset(-60.3)):
        with Locations((-15.4, 0)):
            Rectangle(SKETCH36_W, SKETCH36_H)
    extrude(amount=BOSS_EXTRUDE25_DEPTH)

    # Sketch37 → Boss-Extrude31 (add)
    with BuildSketch(Plane(origin=(-60.3, 0, 0), x_dir=(0, 0, -1), z_dir=(1, 0, 0))):
        with Locations((15.317328584, -28.6)):
            Rectangle(SKETCH37_W, SKETCH37_H)
    extrude(amount=BOSS_EXTRUDE31_DEPTH)

    # Sketch37<2> → Boss-Extrude36 (add)
    with BuildSketch(Plane(origin=(-60.3, 0, 0), x_dir=(0, 0, -1), z_dir=(1, 0, 0))):
        with Locations((15.317328584, -28.6)):
            Rectangle(SKETCH37_2_W, SKETCH37_2_H)
    extrude(amount=BOSS_EXTRUDE36_DEPTH)

    # Sketch37<3> → Boss-Extrude37 (add)
    with BuildSketch(Plane(origin=(-60.3, 0, 0), x_dir=(0, 0, -1), z_dir=(1, 0, 0))):
        with Locations((15.317328584, -28.6)):
            Rectangle(SKETCH37_3_W, SKETCH37_3_H)
    extrude(amount=BOSS_EXTRUDE37_DEPTH)

    # Sketch38 → Boss-Extrude40 (add)
    with BuildSketch(Plane.XZ.offset(-40.3)):
        with Locations((-11.3, -15.4)):
            Rectangle(SKETCH38_W, SKETCH38_H)
    extrude(amount=BOSS_EXTRUDE40_DEPTH)

    # Chamfer1
    chamfer1_edges = [part.edges().sort_by_distance(p)[0] for p in [
        (60.3, 0, -13.4),
        (-60.3, -28.6, -13.317328584),
        (-11.3, 40.3, -13.4),
    ]]
    chamfer(chamfer1_edges, length=CHAMFER1_SIZE - 0.0001)  # a hair under: the kernel refuses the full size

    # Sketch39 → Boss-Extrude41 (add)
    with BuildSketch(Plane(origin=(-60.3, 0, 0), x_dir=(0, 0, -1), z_dir=(1, 0, 0))):
        with Locations((9, 9.8)):
            Rectangle(SKETCH39_W, SKETCH39_H)
    extrude(amount=BOSS_EXTRUDE41_DEPTH)


solid = part.part
